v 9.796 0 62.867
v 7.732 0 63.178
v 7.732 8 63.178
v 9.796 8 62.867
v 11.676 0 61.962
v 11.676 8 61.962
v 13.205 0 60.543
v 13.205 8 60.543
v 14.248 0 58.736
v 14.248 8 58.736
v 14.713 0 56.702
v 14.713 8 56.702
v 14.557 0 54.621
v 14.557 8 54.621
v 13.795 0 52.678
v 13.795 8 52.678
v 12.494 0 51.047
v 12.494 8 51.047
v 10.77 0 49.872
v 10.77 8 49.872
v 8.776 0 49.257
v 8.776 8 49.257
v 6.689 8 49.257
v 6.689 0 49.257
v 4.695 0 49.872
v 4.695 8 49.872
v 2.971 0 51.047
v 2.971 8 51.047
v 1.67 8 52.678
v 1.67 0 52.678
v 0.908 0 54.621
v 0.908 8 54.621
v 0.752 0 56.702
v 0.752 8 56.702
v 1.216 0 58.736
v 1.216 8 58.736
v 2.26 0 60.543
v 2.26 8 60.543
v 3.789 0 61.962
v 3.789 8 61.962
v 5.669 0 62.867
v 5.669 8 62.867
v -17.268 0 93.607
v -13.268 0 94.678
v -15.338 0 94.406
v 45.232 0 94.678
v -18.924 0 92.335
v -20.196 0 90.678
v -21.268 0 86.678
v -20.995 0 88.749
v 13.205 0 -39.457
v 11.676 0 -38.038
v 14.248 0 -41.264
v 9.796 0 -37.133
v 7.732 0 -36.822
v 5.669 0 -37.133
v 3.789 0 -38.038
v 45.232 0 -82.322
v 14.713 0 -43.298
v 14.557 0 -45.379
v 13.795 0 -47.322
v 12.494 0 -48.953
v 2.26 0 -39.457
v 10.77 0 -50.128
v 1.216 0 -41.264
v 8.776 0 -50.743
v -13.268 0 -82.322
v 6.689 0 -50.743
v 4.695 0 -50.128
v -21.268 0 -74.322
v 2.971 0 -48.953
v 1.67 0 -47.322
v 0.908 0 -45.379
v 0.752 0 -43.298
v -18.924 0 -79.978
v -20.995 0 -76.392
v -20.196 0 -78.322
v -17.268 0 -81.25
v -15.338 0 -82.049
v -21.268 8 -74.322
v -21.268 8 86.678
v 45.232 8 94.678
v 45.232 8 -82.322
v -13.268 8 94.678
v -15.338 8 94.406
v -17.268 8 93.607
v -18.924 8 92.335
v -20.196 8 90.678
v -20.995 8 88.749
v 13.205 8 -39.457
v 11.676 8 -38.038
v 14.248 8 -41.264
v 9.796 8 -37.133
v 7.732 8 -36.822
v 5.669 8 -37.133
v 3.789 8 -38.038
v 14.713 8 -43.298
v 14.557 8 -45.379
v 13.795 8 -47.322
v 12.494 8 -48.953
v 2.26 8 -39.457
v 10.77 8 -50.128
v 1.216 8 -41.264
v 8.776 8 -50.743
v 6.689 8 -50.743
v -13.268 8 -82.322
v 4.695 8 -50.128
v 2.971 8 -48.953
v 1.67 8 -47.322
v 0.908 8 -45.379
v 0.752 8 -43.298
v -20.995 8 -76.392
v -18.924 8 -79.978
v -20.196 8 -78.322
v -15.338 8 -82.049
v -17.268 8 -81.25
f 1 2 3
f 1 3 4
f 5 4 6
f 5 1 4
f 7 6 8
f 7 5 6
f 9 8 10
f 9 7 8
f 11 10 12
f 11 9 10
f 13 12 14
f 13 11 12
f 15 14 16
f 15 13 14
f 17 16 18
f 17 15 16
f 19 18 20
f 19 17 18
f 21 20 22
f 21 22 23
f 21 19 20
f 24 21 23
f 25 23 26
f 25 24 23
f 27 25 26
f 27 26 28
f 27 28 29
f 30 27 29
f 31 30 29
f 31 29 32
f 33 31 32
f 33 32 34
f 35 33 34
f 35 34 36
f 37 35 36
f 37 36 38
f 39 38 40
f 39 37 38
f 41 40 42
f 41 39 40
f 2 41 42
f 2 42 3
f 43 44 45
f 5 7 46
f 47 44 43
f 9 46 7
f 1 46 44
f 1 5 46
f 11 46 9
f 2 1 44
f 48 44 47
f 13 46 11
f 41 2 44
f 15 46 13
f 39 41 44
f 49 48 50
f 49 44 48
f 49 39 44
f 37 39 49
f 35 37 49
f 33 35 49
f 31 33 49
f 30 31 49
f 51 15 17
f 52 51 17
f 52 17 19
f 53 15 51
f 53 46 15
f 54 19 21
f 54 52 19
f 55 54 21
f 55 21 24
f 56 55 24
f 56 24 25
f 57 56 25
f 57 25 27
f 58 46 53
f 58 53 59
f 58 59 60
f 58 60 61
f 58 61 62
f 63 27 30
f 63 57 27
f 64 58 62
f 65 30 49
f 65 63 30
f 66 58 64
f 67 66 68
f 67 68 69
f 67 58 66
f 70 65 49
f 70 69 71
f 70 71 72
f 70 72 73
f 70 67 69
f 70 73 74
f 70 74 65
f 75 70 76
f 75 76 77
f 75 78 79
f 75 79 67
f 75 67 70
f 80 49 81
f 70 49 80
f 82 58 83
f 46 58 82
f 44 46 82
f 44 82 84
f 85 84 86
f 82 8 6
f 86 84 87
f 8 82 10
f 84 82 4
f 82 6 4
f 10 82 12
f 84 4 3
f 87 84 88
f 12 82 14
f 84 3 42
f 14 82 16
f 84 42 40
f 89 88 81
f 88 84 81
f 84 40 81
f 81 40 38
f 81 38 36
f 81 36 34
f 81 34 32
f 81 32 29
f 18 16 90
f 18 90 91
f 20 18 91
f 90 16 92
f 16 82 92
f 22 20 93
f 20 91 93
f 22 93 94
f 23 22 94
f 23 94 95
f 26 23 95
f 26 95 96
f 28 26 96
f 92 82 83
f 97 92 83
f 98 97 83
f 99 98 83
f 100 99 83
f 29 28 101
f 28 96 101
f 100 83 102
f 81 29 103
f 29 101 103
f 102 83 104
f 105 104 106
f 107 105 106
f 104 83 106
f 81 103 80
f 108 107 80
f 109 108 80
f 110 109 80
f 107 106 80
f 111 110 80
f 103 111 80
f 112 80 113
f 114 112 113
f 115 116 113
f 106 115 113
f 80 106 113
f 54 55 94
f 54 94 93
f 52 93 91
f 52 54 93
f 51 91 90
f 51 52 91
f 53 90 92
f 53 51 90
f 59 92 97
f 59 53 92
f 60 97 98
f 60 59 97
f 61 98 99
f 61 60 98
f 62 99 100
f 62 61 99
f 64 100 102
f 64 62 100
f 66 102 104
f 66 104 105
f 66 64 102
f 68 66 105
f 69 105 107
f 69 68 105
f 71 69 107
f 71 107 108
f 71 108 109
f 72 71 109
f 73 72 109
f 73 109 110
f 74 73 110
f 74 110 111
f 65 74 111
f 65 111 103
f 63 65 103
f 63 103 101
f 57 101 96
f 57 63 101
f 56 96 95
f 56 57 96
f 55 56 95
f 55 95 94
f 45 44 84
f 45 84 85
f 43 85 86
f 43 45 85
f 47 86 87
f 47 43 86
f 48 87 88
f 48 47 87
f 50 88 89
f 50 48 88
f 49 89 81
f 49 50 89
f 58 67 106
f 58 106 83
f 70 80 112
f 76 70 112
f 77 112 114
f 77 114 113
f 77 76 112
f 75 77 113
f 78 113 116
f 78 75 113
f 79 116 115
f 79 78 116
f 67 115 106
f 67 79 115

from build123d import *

# Parameters (mm, degrees)
SKETCH1_R           = 7
BOSS_EXTRUDE1_DEPTH = 8


with BuildPart() as part:
    # Sketch1 → Boss-Extrude1 (new body)
    with BuildSketch(Plane(origin=(0, 0, 0), x_dir=(1, 0, 0), z_dir=(0, 1, 0))):
        with BuildLine():
            Line((45.232378219, 82.321586231), (45.232378219, -94.678413769))
            Line((45.232378219, -94.678413769), (-13.267621781, -94.678413769))
            ThreePointArc((-13.267621781, -94.678413769), (-18.924476031, -92.335268019), (-21.267621781, -86.678413769))
            Line((-21.267621781, -86.678413769), (-21.267621781, 74.321586231))
            ThreePointArc((-21.267621781, 74.321586231), (-18.924476031, 79.97844048), (-13.267621781, 82.321586231))
            Line((-13.267621781, 82.321586231), (45.232378219, 82.321586231))
        make_face()
        with Locations(Location((7.732378219, -56.178413769, 0), (0, 0, 270))):
            Circle(SKETCH1_R, mode=Mode.SUBTRACT)
        with Locations(Location((7.732378219, 43.821586231, 0), (0, 0, 270))):
            Circle(SKETCH1_R, mode=Mode.SUBTRACT)
    extrude(amount=BOSS_EXTRUDE1_DEPTH)


solid = part.part
